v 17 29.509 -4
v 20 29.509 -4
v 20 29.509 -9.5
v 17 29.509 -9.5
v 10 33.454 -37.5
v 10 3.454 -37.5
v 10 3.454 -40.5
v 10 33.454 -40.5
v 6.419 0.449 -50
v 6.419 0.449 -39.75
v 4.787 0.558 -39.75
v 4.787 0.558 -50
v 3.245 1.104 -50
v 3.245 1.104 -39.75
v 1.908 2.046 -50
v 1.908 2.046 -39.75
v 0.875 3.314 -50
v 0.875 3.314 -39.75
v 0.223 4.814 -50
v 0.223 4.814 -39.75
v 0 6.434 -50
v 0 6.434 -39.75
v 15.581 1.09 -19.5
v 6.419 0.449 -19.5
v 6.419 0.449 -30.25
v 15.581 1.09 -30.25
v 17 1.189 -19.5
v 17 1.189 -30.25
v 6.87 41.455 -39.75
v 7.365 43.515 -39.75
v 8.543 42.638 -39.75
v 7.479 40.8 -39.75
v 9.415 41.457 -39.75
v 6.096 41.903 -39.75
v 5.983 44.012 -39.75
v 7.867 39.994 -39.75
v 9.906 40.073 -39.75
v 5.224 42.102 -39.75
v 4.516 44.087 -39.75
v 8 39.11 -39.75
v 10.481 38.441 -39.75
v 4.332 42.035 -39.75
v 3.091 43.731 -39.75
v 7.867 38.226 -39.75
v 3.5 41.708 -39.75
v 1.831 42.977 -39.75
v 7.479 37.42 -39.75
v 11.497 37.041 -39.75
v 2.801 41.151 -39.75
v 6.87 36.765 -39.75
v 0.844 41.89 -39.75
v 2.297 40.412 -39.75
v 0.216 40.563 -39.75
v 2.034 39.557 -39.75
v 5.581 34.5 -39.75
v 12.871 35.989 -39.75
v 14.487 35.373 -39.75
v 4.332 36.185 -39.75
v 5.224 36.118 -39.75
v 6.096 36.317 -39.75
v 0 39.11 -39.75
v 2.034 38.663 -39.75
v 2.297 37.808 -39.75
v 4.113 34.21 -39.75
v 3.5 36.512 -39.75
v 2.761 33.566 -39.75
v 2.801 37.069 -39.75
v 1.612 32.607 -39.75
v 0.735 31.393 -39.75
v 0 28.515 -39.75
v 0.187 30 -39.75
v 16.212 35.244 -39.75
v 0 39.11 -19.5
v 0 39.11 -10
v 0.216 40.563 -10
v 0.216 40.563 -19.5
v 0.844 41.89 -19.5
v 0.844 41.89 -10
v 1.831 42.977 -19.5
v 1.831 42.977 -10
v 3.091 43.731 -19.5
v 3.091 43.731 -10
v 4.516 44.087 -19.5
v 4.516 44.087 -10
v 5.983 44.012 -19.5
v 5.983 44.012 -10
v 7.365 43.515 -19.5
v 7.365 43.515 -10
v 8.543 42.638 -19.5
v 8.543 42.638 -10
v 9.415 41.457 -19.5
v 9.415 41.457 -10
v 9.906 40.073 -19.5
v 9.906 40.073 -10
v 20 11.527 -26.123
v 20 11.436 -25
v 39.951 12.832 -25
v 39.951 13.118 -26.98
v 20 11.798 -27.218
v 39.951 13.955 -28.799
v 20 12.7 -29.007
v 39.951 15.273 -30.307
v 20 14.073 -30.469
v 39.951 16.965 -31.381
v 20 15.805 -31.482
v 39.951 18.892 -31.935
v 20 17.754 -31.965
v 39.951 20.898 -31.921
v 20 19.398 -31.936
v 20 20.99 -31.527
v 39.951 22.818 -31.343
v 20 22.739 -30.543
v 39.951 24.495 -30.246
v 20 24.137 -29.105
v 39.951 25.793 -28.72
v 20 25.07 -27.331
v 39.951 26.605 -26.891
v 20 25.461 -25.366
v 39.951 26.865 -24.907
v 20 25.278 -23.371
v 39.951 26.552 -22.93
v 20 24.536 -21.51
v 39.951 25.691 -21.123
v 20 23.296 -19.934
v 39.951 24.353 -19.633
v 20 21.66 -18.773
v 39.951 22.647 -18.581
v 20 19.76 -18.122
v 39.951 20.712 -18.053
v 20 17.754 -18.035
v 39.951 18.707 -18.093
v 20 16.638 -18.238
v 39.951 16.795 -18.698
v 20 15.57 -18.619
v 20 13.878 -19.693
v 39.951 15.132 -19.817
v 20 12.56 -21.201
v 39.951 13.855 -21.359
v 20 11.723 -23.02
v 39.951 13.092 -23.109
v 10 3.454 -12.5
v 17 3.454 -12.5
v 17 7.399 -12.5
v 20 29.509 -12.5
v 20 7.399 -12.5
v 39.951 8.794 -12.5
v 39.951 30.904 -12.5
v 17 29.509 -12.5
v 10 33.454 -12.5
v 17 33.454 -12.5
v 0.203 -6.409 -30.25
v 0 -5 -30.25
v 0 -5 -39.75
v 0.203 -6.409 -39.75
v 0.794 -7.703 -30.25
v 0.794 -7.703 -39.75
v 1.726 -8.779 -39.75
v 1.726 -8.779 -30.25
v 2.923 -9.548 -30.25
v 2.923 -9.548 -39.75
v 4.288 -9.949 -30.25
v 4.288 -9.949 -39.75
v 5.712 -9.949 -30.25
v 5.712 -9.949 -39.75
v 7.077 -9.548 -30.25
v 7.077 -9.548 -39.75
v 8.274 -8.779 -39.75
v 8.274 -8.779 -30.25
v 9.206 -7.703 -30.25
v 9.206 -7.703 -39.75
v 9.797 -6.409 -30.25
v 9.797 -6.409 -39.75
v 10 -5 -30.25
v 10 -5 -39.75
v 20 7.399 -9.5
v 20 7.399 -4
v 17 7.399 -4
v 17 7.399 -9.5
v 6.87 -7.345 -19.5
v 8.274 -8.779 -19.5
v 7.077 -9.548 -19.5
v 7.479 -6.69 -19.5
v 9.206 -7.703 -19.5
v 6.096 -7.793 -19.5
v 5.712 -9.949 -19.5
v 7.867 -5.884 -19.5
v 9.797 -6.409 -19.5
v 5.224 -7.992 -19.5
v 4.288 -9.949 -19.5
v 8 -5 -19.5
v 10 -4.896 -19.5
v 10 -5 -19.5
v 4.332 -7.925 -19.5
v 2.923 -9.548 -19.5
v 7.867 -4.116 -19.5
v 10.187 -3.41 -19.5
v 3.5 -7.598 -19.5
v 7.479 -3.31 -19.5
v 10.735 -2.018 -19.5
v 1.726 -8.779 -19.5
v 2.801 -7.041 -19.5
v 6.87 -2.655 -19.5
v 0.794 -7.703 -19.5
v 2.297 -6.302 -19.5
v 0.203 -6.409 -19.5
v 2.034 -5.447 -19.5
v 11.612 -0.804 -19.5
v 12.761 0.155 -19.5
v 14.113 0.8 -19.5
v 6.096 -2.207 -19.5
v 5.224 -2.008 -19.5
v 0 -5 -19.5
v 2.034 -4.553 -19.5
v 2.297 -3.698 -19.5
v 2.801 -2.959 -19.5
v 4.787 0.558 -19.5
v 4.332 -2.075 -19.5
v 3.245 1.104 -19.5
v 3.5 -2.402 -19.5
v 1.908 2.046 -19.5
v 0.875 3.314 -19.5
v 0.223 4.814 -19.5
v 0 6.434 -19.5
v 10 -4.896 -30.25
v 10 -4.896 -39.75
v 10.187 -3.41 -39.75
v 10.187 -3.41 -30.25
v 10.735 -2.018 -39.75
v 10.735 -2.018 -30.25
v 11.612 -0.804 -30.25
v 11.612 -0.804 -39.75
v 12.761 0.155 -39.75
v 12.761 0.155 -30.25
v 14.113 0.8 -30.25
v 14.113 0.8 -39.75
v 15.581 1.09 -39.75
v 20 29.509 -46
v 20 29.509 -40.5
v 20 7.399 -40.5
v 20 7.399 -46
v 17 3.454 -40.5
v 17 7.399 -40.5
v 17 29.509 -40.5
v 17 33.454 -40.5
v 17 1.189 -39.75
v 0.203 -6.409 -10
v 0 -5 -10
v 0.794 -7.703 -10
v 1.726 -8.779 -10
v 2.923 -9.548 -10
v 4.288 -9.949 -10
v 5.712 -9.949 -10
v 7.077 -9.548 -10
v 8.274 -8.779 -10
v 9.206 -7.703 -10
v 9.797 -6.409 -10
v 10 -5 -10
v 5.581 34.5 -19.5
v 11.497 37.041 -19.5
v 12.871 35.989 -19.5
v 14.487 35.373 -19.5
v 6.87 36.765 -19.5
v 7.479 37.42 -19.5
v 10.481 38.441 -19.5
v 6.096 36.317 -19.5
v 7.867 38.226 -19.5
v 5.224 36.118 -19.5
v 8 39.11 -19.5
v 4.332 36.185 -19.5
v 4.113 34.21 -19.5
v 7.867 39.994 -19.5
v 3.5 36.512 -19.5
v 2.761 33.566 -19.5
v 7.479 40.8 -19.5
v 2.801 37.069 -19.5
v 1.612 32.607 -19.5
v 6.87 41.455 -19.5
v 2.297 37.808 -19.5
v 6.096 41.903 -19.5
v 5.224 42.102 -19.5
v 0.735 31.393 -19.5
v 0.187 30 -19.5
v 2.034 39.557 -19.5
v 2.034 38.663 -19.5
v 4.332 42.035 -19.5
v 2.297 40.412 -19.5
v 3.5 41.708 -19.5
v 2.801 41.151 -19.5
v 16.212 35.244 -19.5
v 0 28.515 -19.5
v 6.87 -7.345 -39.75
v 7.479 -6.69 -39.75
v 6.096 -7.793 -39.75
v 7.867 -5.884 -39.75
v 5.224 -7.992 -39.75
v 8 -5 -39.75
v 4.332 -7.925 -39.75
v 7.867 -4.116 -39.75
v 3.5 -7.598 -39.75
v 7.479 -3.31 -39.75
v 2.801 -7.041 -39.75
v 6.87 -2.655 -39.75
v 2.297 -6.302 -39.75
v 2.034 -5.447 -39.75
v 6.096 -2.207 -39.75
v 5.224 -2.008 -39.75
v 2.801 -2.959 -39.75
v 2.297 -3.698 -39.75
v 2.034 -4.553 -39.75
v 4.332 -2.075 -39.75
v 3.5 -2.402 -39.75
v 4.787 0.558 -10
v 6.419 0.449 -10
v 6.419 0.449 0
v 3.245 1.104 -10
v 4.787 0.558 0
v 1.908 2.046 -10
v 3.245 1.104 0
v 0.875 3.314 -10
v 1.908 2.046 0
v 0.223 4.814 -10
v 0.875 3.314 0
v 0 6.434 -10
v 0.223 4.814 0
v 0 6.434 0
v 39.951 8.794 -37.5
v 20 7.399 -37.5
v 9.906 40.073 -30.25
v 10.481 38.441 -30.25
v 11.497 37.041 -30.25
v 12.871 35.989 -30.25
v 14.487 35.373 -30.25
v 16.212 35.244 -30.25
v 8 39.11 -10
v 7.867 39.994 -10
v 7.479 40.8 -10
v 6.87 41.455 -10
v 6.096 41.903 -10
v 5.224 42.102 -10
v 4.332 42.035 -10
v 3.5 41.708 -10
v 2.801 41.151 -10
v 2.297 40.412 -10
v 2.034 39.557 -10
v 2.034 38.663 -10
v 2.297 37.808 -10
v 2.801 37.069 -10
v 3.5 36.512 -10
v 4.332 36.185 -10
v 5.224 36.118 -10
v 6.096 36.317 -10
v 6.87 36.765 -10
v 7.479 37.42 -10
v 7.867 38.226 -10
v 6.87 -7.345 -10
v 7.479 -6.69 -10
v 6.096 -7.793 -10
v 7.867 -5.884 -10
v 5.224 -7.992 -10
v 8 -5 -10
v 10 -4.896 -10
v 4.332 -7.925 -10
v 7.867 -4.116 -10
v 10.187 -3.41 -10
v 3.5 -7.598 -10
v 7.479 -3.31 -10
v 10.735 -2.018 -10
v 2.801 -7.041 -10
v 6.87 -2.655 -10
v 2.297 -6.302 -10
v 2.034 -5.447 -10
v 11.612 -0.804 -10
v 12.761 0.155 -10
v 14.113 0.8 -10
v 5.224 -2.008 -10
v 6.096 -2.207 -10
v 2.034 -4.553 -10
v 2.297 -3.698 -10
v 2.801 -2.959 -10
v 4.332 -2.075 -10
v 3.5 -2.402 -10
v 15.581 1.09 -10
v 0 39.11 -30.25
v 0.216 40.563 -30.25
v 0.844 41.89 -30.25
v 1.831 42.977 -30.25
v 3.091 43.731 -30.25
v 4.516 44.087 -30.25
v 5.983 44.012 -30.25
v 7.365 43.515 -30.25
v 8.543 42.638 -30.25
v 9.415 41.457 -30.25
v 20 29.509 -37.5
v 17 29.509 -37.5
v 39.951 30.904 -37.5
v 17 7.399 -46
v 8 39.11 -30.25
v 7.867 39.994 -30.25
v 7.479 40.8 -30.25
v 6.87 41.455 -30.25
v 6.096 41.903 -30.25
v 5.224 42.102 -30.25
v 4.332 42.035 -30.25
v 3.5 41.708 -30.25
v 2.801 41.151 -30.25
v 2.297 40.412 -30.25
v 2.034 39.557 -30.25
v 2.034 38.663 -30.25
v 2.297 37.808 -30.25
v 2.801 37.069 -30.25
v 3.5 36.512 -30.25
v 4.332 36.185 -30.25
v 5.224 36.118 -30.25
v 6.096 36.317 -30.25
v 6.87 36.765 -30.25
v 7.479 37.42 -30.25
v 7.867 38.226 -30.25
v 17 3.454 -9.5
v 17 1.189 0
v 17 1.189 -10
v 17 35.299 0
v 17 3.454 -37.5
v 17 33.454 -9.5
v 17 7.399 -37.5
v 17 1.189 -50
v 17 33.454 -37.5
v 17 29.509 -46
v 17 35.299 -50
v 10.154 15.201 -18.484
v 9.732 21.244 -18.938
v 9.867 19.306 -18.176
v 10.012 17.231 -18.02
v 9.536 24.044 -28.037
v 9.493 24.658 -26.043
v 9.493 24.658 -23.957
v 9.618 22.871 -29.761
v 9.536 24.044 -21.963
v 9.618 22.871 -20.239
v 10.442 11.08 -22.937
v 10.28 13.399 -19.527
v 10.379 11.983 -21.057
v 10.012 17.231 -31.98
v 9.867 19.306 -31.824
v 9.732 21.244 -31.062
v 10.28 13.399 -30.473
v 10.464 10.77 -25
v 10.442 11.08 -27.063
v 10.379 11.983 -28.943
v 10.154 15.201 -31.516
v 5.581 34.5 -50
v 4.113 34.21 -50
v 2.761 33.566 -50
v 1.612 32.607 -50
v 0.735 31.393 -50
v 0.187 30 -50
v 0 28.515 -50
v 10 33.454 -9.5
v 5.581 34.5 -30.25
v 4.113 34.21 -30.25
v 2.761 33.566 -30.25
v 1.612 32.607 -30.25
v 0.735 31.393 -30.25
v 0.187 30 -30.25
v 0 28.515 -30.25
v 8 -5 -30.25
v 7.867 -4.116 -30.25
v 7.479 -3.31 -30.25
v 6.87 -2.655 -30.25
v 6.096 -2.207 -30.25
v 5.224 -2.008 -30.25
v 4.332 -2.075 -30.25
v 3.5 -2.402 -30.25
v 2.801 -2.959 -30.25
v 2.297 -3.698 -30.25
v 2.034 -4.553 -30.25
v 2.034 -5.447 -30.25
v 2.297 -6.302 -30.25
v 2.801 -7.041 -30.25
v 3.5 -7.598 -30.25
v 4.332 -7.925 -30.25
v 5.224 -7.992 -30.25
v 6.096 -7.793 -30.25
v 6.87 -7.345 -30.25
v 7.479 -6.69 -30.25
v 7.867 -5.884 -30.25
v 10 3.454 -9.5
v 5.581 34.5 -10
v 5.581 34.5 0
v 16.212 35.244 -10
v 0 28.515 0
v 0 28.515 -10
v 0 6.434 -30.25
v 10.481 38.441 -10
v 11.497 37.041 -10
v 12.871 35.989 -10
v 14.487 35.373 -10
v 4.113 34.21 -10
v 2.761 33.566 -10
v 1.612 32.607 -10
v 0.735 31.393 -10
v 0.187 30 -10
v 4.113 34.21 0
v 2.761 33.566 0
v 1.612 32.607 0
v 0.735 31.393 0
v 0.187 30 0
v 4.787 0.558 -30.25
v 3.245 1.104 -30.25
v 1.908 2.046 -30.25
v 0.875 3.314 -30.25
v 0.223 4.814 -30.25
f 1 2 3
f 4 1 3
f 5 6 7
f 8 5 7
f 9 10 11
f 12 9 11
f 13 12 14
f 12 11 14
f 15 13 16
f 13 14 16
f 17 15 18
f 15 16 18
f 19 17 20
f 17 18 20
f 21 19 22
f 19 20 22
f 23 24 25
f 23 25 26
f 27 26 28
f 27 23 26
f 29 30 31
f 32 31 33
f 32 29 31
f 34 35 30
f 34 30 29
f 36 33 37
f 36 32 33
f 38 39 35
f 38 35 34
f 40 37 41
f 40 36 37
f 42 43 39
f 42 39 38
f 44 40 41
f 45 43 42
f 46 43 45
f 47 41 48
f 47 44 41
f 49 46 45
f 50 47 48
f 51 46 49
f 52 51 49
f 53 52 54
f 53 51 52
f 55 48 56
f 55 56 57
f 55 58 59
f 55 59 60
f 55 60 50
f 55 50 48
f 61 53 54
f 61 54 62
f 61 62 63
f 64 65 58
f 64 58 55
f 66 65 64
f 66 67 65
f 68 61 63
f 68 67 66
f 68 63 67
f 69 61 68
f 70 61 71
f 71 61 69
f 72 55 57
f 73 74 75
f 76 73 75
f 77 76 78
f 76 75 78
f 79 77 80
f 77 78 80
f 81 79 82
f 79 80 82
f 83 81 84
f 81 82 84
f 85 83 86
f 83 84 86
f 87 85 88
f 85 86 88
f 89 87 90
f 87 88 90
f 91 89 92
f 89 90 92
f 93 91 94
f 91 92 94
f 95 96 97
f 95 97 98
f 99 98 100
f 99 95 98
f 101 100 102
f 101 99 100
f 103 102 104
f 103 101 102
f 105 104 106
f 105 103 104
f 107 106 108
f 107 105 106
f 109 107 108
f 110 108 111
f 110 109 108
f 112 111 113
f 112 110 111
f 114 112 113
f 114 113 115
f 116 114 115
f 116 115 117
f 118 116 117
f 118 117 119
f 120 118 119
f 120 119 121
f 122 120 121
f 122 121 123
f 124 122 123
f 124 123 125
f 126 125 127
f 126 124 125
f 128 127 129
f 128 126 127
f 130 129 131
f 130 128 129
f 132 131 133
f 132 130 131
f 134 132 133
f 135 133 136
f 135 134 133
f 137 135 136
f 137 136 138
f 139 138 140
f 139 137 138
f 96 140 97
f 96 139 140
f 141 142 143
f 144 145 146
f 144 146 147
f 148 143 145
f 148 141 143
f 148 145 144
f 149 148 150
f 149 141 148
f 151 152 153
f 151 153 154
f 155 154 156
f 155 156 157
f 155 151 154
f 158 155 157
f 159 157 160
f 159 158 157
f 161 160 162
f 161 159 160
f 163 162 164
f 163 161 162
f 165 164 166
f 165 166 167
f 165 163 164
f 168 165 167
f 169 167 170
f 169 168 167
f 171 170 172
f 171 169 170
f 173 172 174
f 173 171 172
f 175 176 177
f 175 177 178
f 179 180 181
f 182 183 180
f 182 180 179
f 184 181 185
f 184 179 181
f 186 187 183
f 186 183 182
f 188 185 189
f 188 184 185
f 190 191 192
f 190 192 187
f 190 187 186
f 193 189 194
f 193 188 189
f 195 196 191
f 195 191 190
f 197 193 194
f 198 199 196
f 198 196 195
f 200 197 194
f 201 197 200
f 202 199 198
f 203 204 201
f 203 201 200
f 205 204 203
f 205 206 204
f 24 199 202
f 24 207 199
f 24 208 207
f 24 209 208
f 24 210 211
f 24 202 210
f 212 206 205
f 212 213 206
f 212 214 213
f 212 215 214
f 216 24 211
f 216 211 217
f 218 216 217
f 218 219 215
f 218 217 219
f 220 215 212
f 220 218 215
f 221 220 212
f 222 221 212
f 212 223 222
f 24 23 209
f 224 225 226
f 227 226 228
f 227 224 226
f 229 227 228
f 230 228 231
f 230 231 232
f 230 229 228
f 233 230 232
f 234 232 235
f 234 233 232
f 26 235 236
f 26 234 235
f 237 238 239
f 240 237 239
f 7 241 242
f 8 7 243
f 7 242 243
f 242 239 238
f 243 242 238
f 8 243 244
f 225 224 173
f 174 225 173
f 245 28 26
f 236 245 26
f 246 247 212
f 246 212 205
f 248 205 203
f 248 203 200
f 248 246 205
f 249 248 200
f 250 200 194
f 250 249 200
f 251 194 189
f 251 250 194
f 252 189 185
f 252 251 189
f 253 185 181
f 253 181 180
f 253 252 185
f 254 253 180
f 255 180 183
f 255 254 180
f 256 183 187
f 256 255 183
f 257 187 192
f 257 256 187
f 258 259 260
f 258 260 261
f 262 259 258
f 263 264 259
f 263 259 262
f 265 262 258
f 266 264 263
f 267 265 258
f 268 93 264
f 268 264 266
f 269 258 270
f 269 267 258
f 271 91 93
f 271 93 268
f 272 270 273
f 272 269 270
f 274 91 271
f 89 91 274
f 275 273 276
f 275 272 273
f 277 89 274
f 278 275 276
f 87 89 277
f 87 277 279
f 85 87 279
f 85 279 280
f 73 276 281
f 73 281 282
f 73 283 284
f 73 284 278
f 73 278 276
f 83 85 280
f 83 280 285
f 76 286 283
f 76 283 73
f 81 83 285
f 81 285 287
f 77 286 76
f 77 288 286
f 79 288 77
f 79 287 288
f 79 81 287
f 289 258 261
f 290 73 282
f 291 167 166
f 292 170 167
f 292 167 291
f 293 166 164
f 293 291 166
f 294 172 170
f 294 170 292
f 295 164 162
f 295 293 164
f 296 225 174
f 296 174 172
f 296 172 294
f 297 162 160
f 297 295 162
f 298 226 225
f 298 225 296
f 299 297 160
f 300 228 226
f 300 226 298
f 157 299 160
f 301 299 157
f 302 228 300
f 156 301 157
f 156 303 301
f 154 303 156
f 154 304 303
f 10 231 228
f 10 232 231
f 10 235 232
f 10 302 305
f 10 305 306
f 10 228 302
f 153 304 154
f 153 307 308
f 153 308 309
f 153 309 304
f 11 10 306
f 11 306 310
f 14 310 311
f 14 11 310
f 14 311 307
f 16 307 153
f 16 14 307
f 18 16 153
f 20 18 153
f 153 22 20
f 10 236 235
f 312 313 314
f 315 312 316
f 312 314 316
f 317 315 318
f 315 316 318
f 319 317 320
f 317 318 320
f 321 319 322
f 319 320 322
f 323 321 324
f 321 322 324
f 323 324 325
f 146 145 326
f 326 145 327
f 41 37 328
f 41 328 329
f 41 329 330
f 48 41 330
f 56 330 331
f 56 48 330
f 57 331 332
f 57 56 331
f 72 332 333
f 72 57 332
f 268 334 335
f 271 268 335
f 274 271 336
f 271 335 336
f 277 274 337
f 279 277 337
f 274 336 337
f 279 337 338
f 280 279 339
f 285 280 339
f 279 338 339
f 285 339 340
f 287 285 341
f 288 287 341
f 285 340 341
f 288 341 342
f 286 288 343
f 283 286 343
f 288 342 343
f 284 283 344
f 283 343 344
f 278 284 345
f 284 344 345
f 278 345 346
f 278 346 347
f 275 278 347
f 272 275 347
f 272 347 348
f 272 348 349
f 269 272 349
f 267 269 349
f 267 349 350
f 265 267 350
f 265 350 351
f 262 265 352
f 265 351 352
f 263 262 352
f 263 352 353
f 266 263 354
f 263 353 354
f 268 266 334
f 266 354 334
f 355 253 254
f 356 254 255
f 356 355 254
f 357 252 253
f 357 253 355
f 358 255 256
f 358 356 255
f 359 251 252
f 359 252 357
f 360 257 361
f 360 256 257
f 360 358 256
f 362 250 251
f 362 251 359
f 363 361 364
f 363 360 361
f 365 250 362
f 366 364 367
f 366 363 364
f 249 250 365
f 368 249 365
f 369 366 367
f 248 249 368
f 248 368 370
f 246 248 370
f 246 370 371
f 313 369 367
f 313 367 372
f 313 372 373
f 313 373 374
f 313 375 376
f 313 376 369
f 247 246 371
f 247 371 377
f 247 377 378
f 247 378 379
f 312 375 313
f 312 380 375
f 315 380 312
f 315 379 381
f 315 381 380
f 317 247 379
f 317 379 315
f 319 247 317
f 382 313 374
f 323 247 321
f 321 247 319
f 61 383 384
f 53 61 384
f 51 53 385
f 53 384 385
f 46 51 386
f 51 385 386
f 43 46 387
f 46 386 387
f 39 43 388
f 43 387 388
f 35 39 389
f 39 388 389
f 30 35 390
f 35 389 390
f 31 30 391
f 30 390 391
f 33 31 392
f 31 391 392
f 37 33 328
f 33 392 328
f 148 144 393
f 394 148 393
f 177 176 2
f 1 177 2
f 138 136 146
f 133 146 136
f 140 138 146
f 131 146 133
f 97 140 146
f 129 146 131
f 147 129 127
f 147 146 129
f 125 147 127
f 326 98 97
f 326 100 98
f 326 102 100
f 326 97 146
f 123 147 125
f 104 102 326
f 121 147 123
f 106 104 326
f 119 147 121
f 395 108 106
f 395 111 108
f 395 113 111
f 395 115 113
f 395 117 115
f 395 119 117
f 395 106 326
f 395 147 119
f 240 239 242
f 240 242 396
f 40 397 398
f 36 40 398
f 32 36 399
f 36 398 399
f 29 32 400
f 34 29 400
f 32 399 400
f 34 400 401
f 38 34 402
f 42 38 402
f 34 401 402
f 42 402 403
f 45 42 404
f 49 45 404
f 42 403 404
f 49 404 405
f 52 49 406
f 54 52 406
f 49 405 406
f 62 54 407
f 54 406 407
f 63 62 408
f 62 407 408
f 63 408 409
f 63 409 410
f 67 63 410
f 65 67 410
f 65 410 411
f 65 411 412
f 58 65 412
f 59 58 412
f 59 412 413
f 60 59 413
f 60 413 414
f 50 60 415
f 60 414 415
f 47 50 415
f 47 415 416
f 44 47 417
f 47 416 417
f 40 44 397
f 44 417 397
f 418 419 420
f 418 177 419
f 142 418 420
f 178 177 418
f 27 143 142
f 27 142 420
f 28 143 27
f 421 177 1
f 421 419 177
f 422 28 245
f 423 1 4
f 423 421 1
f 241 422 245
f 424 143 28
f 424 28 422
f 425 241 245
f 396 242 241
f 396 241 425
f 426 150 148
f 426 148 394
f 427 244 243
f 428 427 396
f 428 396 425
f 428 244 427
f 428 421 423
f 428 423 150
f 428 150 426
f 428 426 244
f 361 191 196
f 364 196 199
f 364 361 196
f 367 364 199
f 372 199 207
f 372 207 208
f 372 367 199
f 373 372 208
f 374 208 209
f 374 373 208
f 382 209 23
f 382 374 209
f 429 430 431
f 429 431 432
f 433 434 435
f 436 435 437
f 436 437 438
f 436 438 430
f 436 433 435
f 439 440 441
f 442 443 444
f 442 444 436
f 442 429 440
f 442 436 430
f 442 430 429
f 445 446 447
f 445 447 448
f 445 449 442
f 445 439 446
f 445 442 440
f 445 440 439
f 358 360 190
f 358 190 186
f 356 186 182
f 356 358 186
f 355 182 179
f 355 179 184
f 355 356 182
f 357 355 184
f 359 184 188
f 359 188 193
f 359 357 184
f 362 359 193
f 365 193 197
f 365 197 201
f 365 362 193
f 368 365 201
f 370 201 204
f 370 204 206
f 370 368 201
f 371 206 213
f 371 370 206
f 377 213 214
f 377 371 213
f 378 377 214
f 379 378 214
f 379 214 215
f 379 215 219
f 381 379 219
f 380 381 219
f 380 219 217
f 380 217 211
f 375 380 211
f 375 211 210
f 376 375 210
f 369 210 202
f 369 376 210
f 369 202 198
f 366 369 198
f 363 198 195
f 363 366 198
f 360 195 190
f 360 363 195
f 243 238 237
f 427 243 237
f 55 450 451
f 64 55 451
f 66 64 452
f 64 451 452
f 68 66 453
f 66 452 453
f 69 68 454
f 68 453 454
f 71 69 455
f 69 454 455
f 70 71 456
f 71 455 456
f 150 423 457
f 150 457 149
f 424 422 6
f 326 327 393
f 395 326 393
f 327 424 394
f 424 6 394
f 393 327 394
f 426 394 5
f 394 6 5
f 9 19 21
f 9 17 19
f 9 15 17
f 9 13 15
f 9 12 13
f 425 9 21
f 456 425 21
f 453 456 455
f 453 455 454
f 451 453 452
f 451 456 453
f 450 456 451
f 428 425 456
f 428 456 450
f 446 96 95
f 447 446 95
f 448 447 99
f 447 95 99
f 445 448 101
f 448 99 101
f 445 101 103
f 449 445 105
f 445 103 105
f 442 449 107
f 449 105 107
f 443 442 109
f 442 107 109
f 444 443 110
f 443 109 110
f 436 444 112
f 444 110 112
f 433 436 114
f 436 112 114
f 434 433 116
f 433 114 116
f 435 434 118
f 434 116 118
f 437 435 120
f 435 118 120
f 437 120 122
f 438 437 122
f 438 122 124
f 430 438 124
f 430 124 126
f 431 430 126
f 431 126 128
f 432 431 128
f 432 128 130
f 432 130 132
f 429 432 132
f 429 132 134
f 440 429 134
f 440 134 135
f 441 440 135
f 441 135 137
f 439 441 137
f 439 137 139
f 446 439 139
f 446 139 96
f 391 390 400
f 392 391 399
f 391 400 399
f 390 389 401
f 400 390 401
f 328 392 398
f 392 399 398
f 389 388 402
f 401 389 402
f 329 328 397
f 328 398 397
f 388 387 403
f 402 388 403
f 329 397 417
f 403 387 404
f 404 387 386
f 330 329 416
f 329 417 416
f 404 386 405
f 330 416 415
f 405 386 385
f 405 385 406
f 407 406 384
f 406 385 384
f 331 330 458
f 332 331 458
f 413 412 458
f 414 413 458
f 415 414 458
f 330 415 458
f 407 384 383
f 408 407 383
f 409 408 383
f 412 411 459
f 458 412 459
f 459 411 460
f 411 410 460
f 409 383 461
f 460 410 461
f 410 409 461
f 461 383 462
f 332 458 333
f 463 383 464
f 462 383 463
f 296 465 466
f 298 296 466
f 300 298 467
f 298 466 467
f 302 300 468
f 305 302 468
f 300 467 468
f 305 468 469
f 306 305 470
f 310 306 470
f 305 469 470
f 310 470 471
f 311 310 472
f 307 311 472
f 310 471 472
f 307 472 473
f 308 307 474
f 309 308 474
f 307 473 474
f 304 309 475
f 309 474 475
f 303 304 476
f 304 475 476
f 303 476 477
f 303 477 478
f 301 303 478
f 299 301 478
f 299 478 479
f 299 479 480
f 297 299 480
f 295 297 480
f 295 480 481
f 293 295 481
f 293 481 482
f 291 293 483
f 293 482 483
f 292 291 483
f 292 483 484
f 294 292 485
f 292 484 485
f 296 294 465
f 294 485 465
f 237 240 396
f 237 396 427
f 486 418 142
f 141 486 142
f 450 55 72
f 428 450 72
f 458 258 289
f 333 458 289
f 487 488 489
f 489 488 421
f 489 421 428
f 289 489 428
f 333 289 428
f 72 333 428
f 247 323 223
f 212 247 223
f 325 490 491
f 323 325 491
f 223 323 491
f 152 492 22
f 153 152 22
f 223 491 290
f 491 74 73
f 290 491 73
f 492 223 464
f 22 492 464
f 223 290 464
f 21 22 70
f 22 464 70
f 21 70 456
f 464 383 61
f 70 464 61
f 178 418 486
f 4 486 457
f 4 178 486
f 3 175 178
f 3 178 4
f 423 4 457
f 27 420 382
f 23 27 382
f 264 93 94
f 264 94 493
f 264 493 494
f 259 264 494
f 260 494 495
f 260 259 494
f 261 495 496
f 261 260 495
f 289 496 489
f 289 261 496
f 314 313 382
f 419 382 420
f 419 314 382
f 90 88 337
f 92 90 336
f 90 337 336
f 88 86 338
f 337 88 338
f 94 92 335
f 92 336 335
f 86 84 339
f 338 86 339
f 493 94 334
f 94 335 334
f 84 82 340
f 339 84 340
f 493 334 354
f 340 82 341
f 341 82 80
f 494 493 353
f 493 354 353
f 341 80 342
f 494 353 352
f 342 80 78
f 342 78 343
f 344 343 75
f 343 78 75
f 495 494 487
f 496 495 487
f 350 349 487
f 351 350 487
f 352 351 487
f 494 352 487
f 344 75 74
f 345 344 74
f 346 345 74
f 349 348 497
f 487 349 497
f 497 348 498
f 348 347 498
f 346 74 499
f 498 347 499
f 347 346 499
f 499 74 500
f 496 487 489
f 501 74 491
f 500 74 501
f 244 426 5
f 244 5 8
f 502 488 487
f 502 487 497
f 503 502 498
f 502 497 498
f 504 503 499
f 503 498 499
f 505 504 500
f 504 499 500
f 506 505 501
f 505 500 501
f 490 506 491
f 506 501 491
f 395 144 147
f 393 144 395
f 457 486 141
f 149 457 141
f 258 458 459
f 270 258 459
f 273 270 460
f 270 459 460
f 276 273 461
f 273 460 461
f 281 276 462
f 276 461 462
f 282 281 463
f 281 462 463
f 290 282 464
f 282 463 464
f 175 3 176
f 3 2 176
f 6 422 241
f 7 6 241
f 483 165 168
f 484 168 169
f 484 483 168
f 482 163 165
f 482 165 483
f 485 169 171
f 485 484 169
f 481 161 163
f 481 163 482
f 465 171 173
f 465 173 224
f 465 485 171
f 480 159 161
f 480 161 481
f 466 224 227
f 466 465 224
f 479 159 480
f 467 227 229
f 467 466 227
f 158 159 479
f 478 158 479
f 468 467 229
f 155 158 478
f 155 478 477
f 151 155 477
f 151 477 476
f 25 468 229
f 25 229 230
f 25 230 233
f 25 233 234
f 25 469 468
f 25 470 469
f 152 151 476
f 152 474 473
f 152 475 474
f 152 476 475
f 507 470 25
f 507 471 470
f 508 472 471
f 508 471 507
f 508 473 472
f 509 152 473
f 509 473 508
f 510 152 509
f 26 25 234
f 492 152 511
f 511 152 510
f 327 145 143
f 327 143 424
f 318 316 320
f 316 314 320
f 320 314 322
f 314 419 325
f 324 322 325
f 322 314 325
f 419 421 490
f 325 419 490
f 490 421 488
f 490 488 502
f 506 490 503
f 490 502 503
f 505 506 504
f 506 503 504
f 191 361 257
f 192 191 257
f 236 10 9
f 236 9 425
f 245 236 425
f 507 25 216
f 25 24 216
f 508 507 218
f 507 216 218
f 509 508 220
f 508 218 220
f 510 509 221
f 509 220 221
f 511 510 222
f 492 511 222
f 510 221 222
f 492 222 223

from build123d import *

# Parameters (mm, degrees)
SKETCH1_W                      = 50
SKETCH1_H                      = 34.11
BOSS_EXTRUDE1_DEPTH            = 20
SKETCH3_R                      = 3
BOSS_EXTRUDE2_DEPTH            = 9.5
LPATTERN1_COUNT                = 2
LPATTERN1_PITCH                = 20.25
MIRROR1_COPY_1_SKETCH_R        = 3
MIRROR1_COPY_1_DEPTH           = 9.5
BOSS_EXTRUDE3_REACH            = 71.611
CUT_EXTRUDE3_DEPTH             = 10
CUT_EXTRUDE4_START             = -19.5
CUT_EXTRUDE4_DEPTH             = 10.75
CUT_EXTRUDE5_START             = -39.75
CUT_EXTRUDE5_DEPTH             = 10.25
CUT_EXTRUDE6_DEPTH             = 50
SKETCH6_W                      = 3
SKETCH6_H                      = 30
CUT_EXTRUDE2_DEPTH             = 10
SKETCH10_W                     = 50
SKETCH10_H                     = 34.11
SKETCH10_W_2                   = 42
SKETCH10_H_2                   = 22.11
CUT_EXTRUDE7_DEPTH             = 3
CUT_EXTRUDE8_REACH             = 70.733
SKETCH11_W                     = 3
SKETCH11_H                     = 50
FILLET1_R                      = 6
SKETCH5_R                      = 7
CUT_EXTRUDE1_DEPTH             = 10
CUT_EXTRUDE1_DIRECTION_2_REACH = 44.371
SKETCH13_W                     = 25
SKETCH13_H                     = 22.11
SKETCH13_RX                    = 7.017093287
SKETCH13_RY                    = 7
BOSS_EXTRUDE4_DEPTH            = 20


with BuildPart() as part:
    # Sketch1 → Boss-Extrude1 (new body)
    with BuildSketch(Plane(origin=(0, 0, 0), x_dir=(0, 0, -1), z_dir=(1, 0, 0))):
        with Locations((25, 17.055)):
            Rectangle(SKETCH1_W, SKETCH1_H)
    extrude(amount=BOSS_EXTRUDE1_DEPTH)

    # Sketch3 → Boss-Extrude2 (add)
    with BuildSketch(Plane.XY.offset(-10)):
        with BuildLine():
            Line((0, 34.11), (0, 39.11))
            ThreePointArc((0, 39.11), (5, 44.11), (10, 39.11))
            Line((10, 39.11), (10, 34.11))
            Line((10, 34.11), (5, 34.11))
            Line((5, 34.11), (0, 34.11))
        make_face()
        with Locations((5, 39.11)):
            Circle(SKETCH3_R, mode=Mode.SUBTRACT)
    boss_extrude2 = extrude(amount=-BOSS_EXTRUDE2_DEPTH)

    # LPattern1: Boss-Extrude2 ×2
    with Locations(*[(0, 0, -i * LPATTERN1_PITCH) for i in range(1, LPATTERN1_COUNT)]):
        add(boss_extrude2)

    # Mirror1: Boss-Extrude2 across plane
    add(boss_extrude2.mirror(Plane.ZX.offset(17.055)))

    # Mirror1 copy 1 sketch → Mirror1 copy 1 (add)
    with BuildSketch(Plane(origin=(0, 34.11, -30.25), x_dir=(1, 0, 0), z_dir=(0, 0, 1))):
        with BuildLine():
            Line((0, -34.11), (0, -39.11))
            ThreePointArc((0, -39.11), (5, -44.11), (10, -39.11))
            Line((10, -39.11), (10, -34.11))
            Line((10, -34.11), (5, -34.11))
            Line((5, -34.11), (0, -34.11))
        make_face()
        with Locations((5, -39.11)):
            Circle(MIRROR1_COPY_1_SKETCH_R, mode=Mode.SUBTRACT)
    extrude(amount=-MIRROR1_COPY_1_DEPTH)

    # Boss-Extrude3: up to this face of the body (flat: up to its plane)
    boss_extrude3_end = Plane(part.part.faces().sort_by_distance((10, 17.055, -50))[0])
    # Sketch7 → Boss-Extrude3 (add, up to the picked face)
    with BuildSketch(Plane.XY, mode=Mode.PRIVATE) as boss_extrude3_sk1:
        Polygon((20, 34.11), (0, 34.11), (20, 35.508536239), align=None)
    boss_extrude3_tool1 = split(extrude(boss_extrude3_sk1.sketch, amount=-BOSS_EXTRUDE3_REACH, mode=Mode.PRIVATE), bisect_by=boss_extrude3_end, keep=Keep.BOTH, mode=Mode.PRIVATE)
    add(boss_extrude3_tool1.solids().sort_by(Axis((13.333333, 34.576179, 0), (0, 0, -1)))[0])

    # Sketch8 → Cut-Extrude3 (cut)
    with BuildSketch(Plane.XY):
        Polygon((0, 0), (20, 1.398536239), (20, 0), align=None)
    extrude(amount=-CUT_EXTRUDE3_DEPTH, mode=Mode.SUBTRACT)

    # Sketch8<2> → Cut-Extrude4 (cut)
    with BuildSketch(Plane.XY.offset(CUT_EXTRUDE4_START)):
        Polygon((0, 0), (20, 1.398536239), (20, 0), align=None)
    extrude(amount=-CUT_EXTRUDE4_DEPTH, mode=Mode.SUBTRACT)

    # Sketch8<3> → Cut-Extrude5 (cut)
    with BuildSketch(Plane.XY.offset(CUT_EXTRUDE5_START)):
        Polygon((0, 0), (20, 1.398536239), (20, 0), align=None)
    extrude(amount=-CUT_EXTRUDE5_DEPTH, mode=Mode.SUBTRACT)

    # Sketch9 → Cut-Extrude6 (cut)
    with BuildSketch(Plane.XY):
        Polygon((20, 1.398536239), (10, 0.699268119), (10, 0), (20, 0), align=None)
    extrude(amount=-CUT_EXTRUDE6_DEPTH, mode=Mode.SUBTRACT)

    # Sketch6 → Cut-Extrude2 (cut)
    with BuildSketch(Plane(origin=(20, 0, 0), x_dir=(0, 0, -1), z_dir=(1, 0, 0))):
        with Locations((11, 18.453536239)):
            Rectangle(SKETCH6_W, SKETCH6_H)
        with Locations((39, 18.453536239)):
            Rectangle(SKETCH6_W, SKETCH6_H)
    extrude(amount=-CUT_EXTRUDE2_DEPTH, mode=Mode.SUBTRACT)

    # Sketch10 → Cut-Extrude7 (cut)
    with BuildSketch(Plane(origin=(20, 0, 0), x_dir=(0, 0, -1), z_dir=(1, 0, 0))):
        with Locations((25, 18.453536239)):
            Rectangle(SKETCH10_W, SKETCH10_H)
        with Locations((25, 18.453536239)):
            Rectangle(SKETCH10_W_2, SKETCH10_H_2, mode=Mode.SUBTRACT)
    extrude(amount=-CUT_EXTRUDE7_DEPTH, mode=Mode.SUBTRACT)

    # Cut-Extrude8: up to this face of the body (flat: up to its plane)
    cut_extrude8_end = Plane(part.part.faces().sort_by_distance((11.172839506, 0.781281047, -25.029320988))[0])
    # Sketch11 → Cut-Extrude8 (cut, up to the picked face)
    with BuildSketch(Plane(origin=(0, 1.398536239, 0), x_dir=(1, 0, 0), z_dir=(0, 1, 0)), mode=Mode.PRIVATE) as cut_extrude8_sk1:
        with Locations((18.5, 25)):
            Rectangle(SKETCH11_W, SKETCH11_H)
    cut_extrude8_tool1 = split(extrude(cut_extrude8_sk1.sketch, amount=-CUT_EXTRUDE8_REACH, mode=Mode.PRIVATE), bisect_by=cut_extrude8_end, keep=Keep.BOTH, mode=Mode.PRIVATE)
    add(cut_extrude8_tool1.solids().sort_by(Axis((18.5, 1.398536, -25), (0, -1, 0)))[0], mode=Mode.SUBTRACT)

    # Fillet1
    # the kernel refuses this fillet: 6 mm, written as the material it adds along each edge
    with BuildSketch(Plane(origin=(10, 0.699268119, -10), x_dir=(0, -1, 0), z_dir=(0, 0, -1)), Plane(origin=(10, 0.699268119, -30.25), x_dir=(0, -1, 0), z_dir=(0, 0, -1))) as fillet1_piece_1:
        with BuildLine():
            CenterArc((FILLET1_R * 0.932515086138, -FILLET1_R), FILLET1_R, 90, 86)
            Line((-FILLET1_R * 0.0650489641222, -FILLET1_R * 0.930243526256), (0, 0))
            Line((0, 0), (FILLET1_R * 0.932515086138, 0))
        make_face()
    extrude(amount=9.5)
    with BuildSketch(Plane(origin=(10, 0.699268119, -10), x_dir=(0, -1, 0), z_dir=(0, 0, -1))) as fillet1_piece_2_section:
        with BuildLine():
            CenterArc((FILLET1_R * 0.932515086138, -FILLET1_R), FILLET1_R, 90, 86)
            Line((-FILLET1_R * 0.0650489641222, -FILLET1_R * 0.930243526256), (0, 0))
            Line((0, 0), (FILLET1_R * 0.932515086138, 0))
        make_face()
    fillet1_piece_2 = extrude(amount=23.487726292, mode=Mode.PRIVATE)
    fillet1_piece_2 = split(fillet1_piece_2, bisect_by=Plane(origin=(11.254012423, -0.470117383, -30.25), z_dir=(0, 0, -1)), keep=Keep.TOP, mode=Mode.PRIVATE)
    add(fillet1_piece_2)
    with BuildSketch(Plane(origin=(10, 0.699268119, -16.262273708), x_dir=(0, -1, 0), z_dir=(0, 0, -1))) as fillet1_piece_3_section:
        with BuildLine():
            CenterArc((FILLET1_R * 0.932515086138, -FILLET1_R), FILLET1_R, 90, 86)
            Line((-FILLET1_R * 0.0650489641222, -FILLET1_R * 0.930243526256), (0, 0))
            Line((0, 0), (FILLET1_R * 0.932515086138, 0))
        make_face()
    fillet1_piece_3 = extrude(amount=23.487726292, mode=Mode.PRIVATE)
    fillet1_piece_3 = split(fillet1_piece_3, bisect_by=Plane(origin=(11.254012423, -0.470117383, -19.5), z_dir=(0, 0, 1)), keep=Keep.TOP, mode=Mode.PRIVATE)
    add(fillet1_piece_3)
    with BuildSketch(Plane(origin=(10, 34.809268119, -39.75), x_dir=(-0.017789045338557734, 0.9998417624134045, 0), z_dir=(0, 0, 1)), Plane(origin=(10, 34.809268119, -19.5), x_dir=(-0.017789045338557734, 0.9998417624134045, 0), z_dir=(0, 0, 1))) as fillet1_piece_4:
        with BuildLine():
            CenterArc((6.31571957, -5.907243477), FILLET1_R, 100.087773501, 82.892935515)
            Line((0.323836974, -6.219241818), (-0.275351285, -6.250441652))
            Line((-0.275351285, -6.250441652), (-0.59918826, -0.031199834))
            Line((-0.59918826, -0.031199834), (0.010673427, 0.599905057))
            ThreePointArc((0.010673427, 0.599905057), (4.31072477, 0.523399143), (5.15968577, 0.590724348))
            Line((5.15968577, 0.590724348), (5.264779752, 0))
        make_face()
    extrude(amount=9.5)
    with BuildSketch(Plane(origin=(10, 34.809268119, -39.75), x_dir=(-0.017789045338557734, 0.9998417624134045, 0), z_dir=(0, 0, 1))) as fillet1_piece_5_section:
        with BuildLine():
            CenterArc((6.31571957, -5.907243477), FILLET1_R, 100.087773501, 82.892935515)
            Line((0.323836974, -6.219241818), (-0.275351285, -6.250441652))
            Line((-0.275351285, -6.250441652), (-0.59918826, -0.031199834))
            Line((-0.59918826, -0.031199834), (0.010673427, 0.599905057))
            ThreePointArc((0.010673427, 0.599905057), (4.31072477, 0.523399143), (5.15968577, 0.590724348))
            Line((5.15968577, 0.590724348), (5.264779752, 0))
        make_face()
    fillet1_piece_5 = extrude(amount=25.069168086, mode=Mode.PRIVATE)
    fillet1_piece_5 = split(fillet1_piece_5, bisect_by=Plane(origin=(11.504368247, 36.050278399, -19.5), z_dir=(0, 0, 1)), keep=Keep.TOP, mode=Mode.PRIVATE)
    add(fillet1_piece_5)
    with BuildSketch(Plane(origin=(10, 34.809268119, -35.069168086), x_dir=(-0.017789045338557734, 0.9998417624134045, 0), z_dir=(0, 0, 1))) as fillet1_piece_6_section:
        with BuildLine():
            CenterArc((6.31571957, -5.907243477), FILLET1_R, 100.087773501, 82.892935515)
            Line((0.323836974, -6.219241818), (-0.275351285, -6.250441652))
            Line((-0.275351285, -6.250441652), (-0.59918826, -0.031199834))
            Line((-0.59918826, -0.031199834), (0.010673427, 0.599905057))
            ThreePointArc((0.010673427, 0.599905057), (4.31072477, 0.523399143), (5.15968577, 0.590724348))
            Line((5.15968577, 0.590724348), (5.264779752, 0))
        make_face()
    fillet1_piece_6 = extrude(amount=25.069168086, mode=Mode.PRIVATE)
    fillet1_piece_6 = split(fillet1_piece_6, bisect_by=Plane(origin=(11.504368247, 36.050278399, -30.25), z_dir=(0, 0, -1)), keep=Keep.TOP, mode=Mode.PRIVATE)
    add(fillet1_piece_6)
    # the kernel refuses this fillet: 6 mm, written as the material it takes off along each edge
    with BuildSketch(Plane(origin=(0, 0, 16.08553065), x_dir=(0, 1, 0), z_dir=(0, 0, -1))) as fillet1_2_piece_1:
        with BuildLine():
            CenterArc((FILLET1_R * 1.07236871002, FILLET1_R), FILLET1_R, 176, 94)
            Line((FILLET1_R * 0.0748046597649, FILLET1_R * 1.06975647374), (0, 0))
            Line((0, 0), (FILLET1_R * 1.07236871002, 0))
        make_face()
    extrude(amount=26.08553065, mode=Mode.SUBTRACT)
    with BuildSketch(Plane(origin=(0, 0, 16.08553065), x_dir=(0, 1, 0), z_dir=(0, 0, -1))) as fillet1_2_piece_2_section:
        with BuildLine():
            CenterArc((FILLET1_R * 1.07236871002, FILLET1_R), FILLET1_R, 176, 94)
            Line((FILLET1_R * 0.0748046597649, FILLET1_R * 1.06975647374), (0, 0))
            Line((0, 0), (FILLET1_R * 1.07236871002, 0))
        make_face()
    fillet1_2_piece_2 = extrude(amount=42.171061301, mode=Mode.PRIVATE)
    fillet1_2_piece_2 = split(fillet1_2_piece_2, bisect_by=Plane(origin=(1.465256167, 1.571294865, -19.5), z_dir=(0, 0, -1)), keep=Keep.TOP, mode=Mode.PRIVATE)
    add(fillet1_2_piece_2, mode=Mode.SUBTRACT)
    with BuildSketch(Plane(origin=(0, 0, -3.41446935), x_dir=(0, 1, 0), z_dir=(0, 0, -1))) as fillet1_2_piece_3_section:
        with BuildLine():
            CenterArc((FILLET1_R * 1.07236871002, FILLET1_R), FILLET1_R, 176, 94)
            Line((FILLET1_R * 0.0748046597649, FILLET1_R * 1.06975647374), (0, 0))
            Line((0, 0), (FILLET1_R * 1.07236871002, 0))
        make_face()
    fillet1_2_piece_3 = extrude(amount=26.83553065, mode=Mode.PRIVATE)
    fillet1_2_piece_3 = split(fillet1_2_piece_3, bisect_by=Plane(origin=(1.465256167, 1.571294865, -10), z_dir=(0, 0, 1)), keep=Keep.TOP, mode=Mode.PRIVATE)
    add(fillet1_2_piece_3, mode=Mode.SUBTRACT)
    with BuildSketch(Plane(origin=(0, 0, -19.5), x_dir=(0, 1, 0), z_dir=(0, 0, -1))) as fillet1_2_piece_4:
        with BuildLine():
            CenterArc((FILLET1_R * 1.07236871002, FILLET1_R), FILLET1_R, 176, 94)
            Line((FILLET1_R * 0.0748046597649, FILLET1_R * 1.06975647374), (0, 0))
            Line((0, 0), (FILLET1_R * 1.07236871002, 0))
        make_face()
    extrude(amount=10.75, mode=Mode.SUBTRACT)
    with BuildSketch(Plane(origin=(0, 0, -19.5), x_dir=(0, 1, 0), z_dir=(0, 0, -1))) as fillet1_2_piece_5_section:
        with BuildLine():
            CenterArc((FILLET1_R * 1.07236871002, FILLET1_R), FILLET1_R, 176, 94)
            Line((FILLET1_R * 0.0748046597649, FILLET1_R * 1.06975647374), (0, 0))
            Line((0, 0), (FILLET1_R * 1.07236871002, 0))
        make_face()
    fillet1_2_piece_5 = extrude(amount=26.83553065, mode=Mode.PRIVATE)
    fillet1_2_piece_5 = split(fillet1_2_piece_5, bisect_by=Plane(origin=(1.465256167, 1.571294865, -39.75), z_dir=(0, 0, -1)), keep=Keep.TOP, mode=Mode.PRIVATE)
    add(fillet1_2_piece_5, mode=Mode.SUBTRACT)
    with BuildSketch(Plane(origin=(0, 0, -23.66446935), x_dir=(0, 1, 0), z_dir=(0, 0, -1))) as fillet1_2_piece_6_section:
        with BuildLine():
            CenterArc((FILLET1_R * 1.07236871002, FILLET1_R), FILLET1_R, 176, 94)
            Line((FILLET1_R * 0.0748046597649, FILLET1_R * 1.06975647374), (0, 0))
            Line((0, 0), (FILLET1_R * 1.07236871002, 0))
        make_face()
    fillet1_2_piece_6 = extrude(amount=42.421061301, mode=Mode.PRIVATE)
    fillet1_2_piece_6 = split(fillet1_2_piece_6, bisect_by=Plane(origin=(1.465256167, 1.571294865, -30.25), z_dir=(0, 0, 1)), keep=Keep.TOP, mode=Mode.PRIVATE)
    add(fillet1_2_piece_6, mode=Mode.SUBTRACT)
    with BuildSketch(Plane(origin=(0, 0, -39.75), x_dir=(0, 1, 0), z_dir=(0, 0, -1))) as fillet1_2_piece_7:
        with BuildLine():
            CenterArc((FILLET1_R * 1.07236871002, FILLET1_R), FILLET1_R, 176, 94)
            Line((FILLET1_R * 0.0748046597649, FILLET1_R * 1.06975647374), (0, 0))
            Line((0, 0), (FILLET1_R * 1.07236871002, 0))
        make_face()
    extrude(amount=26.33553065, mode=Mode.SUBTRACT)
    with BuildSketch(Plane(origin=(0, 34.11, -63.987726292), x_dir=(0, -1, 0), z_dir=(0, 0, 1))) as fillet1_2_piece_8:
        with BuildLine():
            CenterArc((FILLET1_R * 0.932515086138, FILLET1_R), FILLET1_R, 184, 86)
            Line((-FILLET1_R * 0.0650489641222, FILLET1_R * 0.930243526256), (0, 0))
            Line((0, 0), (FILLET1_R * 0.932515086138, 0))
        make_face()
    extrude(amount=24.237726292, mode=Mode.SUBTRACT)
    with BuildSketch(Plane(origin=(0, 34.11, -63.987726292), x_dir=(0, -1, 0), z_dir=(0, 0, 1))) as fillet1_2_piece_9_section:
        with BuildLine():
            CenterArc((FILLET1_R * 0.932515086138, FILLET1_R), FILLET1_R, 184, 86)
            Line((-FILLET1_R * 0.0650489641222, FILLET1_R * 0.930243526256), (0, 0))
            Line((0, 0), (FILLET1_R * 0.932515086138, 0))
        make_face()
    fillet1_2_piece_9 = extrude(amount=38.225452584, mode=Mode.PRIVATE)
    fillet1_2_piece_9 = split(fillet1_2_piece_9, bisect_by=Plane(origin=(1.254012423, 32.940614497, -30.25), z_dir=(0, 0, 1)), keep=Keep.TOP, mode=Mode.PRIVATE)
    add(fillet1_2_piece_9, mode=Mode.SUBTRACT)
    with BuildSketch(Plane(origin=(0, 34.11, -44.237726292), x_dir=(0, -1, 0), z_dir=(0, 0, 1))) as fillet1_2_piece_10_section:
        with BuildLine():
            CenterArc((FILLET1_R * 0.932515086138, FILLET1_R), FILLET1_R, 184, 86)
            Line((-FILLET1_R * 0.0650489641222, FILLET1_R * 0.930243526256), (0, 0))
            Line((0, 0), (FILLET1_R * 0.932515086138, 0))
        make_face()
    fillet1_2_piece_10 = extrude(amount=24.737726292, mode=Mode.PRIVATE)
    fillet1_2_piece_10 = split(fillet1_2_piece_10, bisect_by=Plane(origin=(1.254012423, 32.940614497, -39.75), z_dir=(0, 0, -1)), keep=Keep.TOP, mode=Mode.PRIVATE)
    add(fillet1_2_piece_10, mode=Mode.SUBTRACT)
    with BuildSketch(Plane(origin=(0, 34.11, -30.25), x_dir=(0, -1, 0), z_dir=(0, 0, 1))) as fillet1_2_piece_11:
        with BuildLine():
            CenterArc((FILLET1_R * 0.932515086138, FILLET1_R), FILLET1_R, 184, 86)
            Line((-FILLET1_R * 0.0650489641222, FILLET1_R * 0.930243526256), (0, 0))
            Line((0, 0), (FILLET1_R * 0.932515086138, 0))
        make_face()
    extrude(amount=10.75, mode=Mode.SUBTRACT)
    with BuildSketch(Plane(origin=(0, 34.11, -30.25), x_dir=(0, -1, 0), z_dir=(0, 0, 1))) as fillet1_2_piece_12_section:
        with BuildLine():
            CenterArc((FILLET1_R * 0.932515086138, FILLET1_R), FILLET1_R, 184, 86)
            Line((-FILLET1_R * 0.0650489641222, FILLET1_R * 0.930243526256), (0, 0))
            Line((0, 0), (FILLET1_R * 0.932515086138, 0))
        make_face()
    fillet1_2_piece_12 = extrude(amount=24.737726292, mode=Mode.PRIVATE)
    fillet1_2_piece_12 = split(fillet1_2_piece_12, bisect_by=Plane(origin=(1.254012423, 32.940614497, -10), z_dir=(0, 0, 1)), keep=Keep.TOP, mode=Mode.PRIVATE)
    add(fillet1_2_piece_12, mode=Mode.SUBTRACT)
    with BuildSketch(Plane(origin=(0, 34.11, -23.987726292), x_dir=(0, -1, 0), z_dir=(0, 0, 1))) as fillet1_2_piece_13_section:
        with BuildLine():
            CenterArc((FILLET1_R * 0.932515086138, FILLET1_R), FILLET1_R, 184, 86)
            Line((-FILLET1_R * 0.0650489641222, FILLET1_R * 0.930243526256), (0, 0))
            Line((0, 0), (FILLET1_R * 0.932515086138, 0))
        make_face()
    fillet1_2_piece_13 = extrude(amount=37.975452584, mode=Mode.PRIVATE)
    fillet1_2_piece_13 = split(fillet1_2_piece_13, bisect_by=Plane(origin=(1.254012423, 32.940614497, -19.5), z_dir=(0, 0, -1)), keep=Keep.TOP, mode=Mode.PRIVATE)
    add(fillet1_2_piece_13, mode=Mode.SUBTRACT)
    with BuildSketch(Plane(origin=(0, 34.11, -10), x_dir=(0, -1, 0), z_dir=(0, 0, 1))) as fillet1_2_piece_14:
        with BuildLine():
            CenterArc((FILLET1_R * 0.932515086138, FILLET1_R), FILLET1_R, 184, 86)
            Line((-FILLET1_R * 0.0650489641222, FILLET1_R * 0.930243526256), (0, 0))
            Line((0, 0), (FILLET1_R * 0.932515086138, 0))
        make_face()
    extrude(amount=23.987726292, mode=Mode.SUBTRACT)

    # Sketch5 → Cut-Extrude1 (cut)
    with BuildSketch(Plane(origin=(20, 17.754268119, -25), x_dir=(0, 0, -1), z_dir=(0.9975640502598249, 0.06975647374411839, 0))):
        with Locations(Location((0, 0.697564737, 0), (0, 0, 270))):
            Circle(SKETCH5_R)
    extrude(amount=-CUT_EXTRUDE1_DEPTH, mode=Mode.SUBTRACT)

    # Sketch5 → Cut-Extrude1 direction 2 (cut, up to next)
    with BuildSketch(Plane(origin=(20, 17.754268119, -25), x_dir=(0, 0, -1), z_dir=(0.9975640502598249, 0.06975647374411839, 0)), mode=Mode.PRIVATE) as cut_extrude1_direction_2_sk1:
        with Locations(Location((0, 0.697564737, 0), (0, 0, 270))):
            Circle(SKETCH5_R)
    cut_extrude1_direction_2_tool1 = extrude(cut_extrude1_direction_2_sk1.sketch, amount=CUT_EXTRUDE1_DIRECTION_2_REACH, mode=Mode.PRIVATE) & part.part
    add(cut_extrude1_direction_2_tool1.solids().sort_by_distance((19.95134, 18.450134, -25))[0], mode=Mode.SUBTRACT)

    # Sketch13 → Boss-Extrude4 (add, along a direction that is not the sketch's normal)
    with BuildSketch(Plane(origin=(20, 0, 0), x_dir=(0, 0, -1), z_dir=(1, 0, 0))):
        with Locations((25, 18.453536239)):
            Rectangle(SKETCH13_W, SKETCH13_H)
        with Locations(Location((25, 18.453536239), (0, 0, -90))):
            Ellipse(SKETCH13_RX, SKETCH13_RY, mode=Mode.SUBTRACT)
    extrude(amount=BOSS_EXTRUDE4_DEPTH, dir=(0.9975640502598249, 0.0697564737441187, 0))


solid = part.part
